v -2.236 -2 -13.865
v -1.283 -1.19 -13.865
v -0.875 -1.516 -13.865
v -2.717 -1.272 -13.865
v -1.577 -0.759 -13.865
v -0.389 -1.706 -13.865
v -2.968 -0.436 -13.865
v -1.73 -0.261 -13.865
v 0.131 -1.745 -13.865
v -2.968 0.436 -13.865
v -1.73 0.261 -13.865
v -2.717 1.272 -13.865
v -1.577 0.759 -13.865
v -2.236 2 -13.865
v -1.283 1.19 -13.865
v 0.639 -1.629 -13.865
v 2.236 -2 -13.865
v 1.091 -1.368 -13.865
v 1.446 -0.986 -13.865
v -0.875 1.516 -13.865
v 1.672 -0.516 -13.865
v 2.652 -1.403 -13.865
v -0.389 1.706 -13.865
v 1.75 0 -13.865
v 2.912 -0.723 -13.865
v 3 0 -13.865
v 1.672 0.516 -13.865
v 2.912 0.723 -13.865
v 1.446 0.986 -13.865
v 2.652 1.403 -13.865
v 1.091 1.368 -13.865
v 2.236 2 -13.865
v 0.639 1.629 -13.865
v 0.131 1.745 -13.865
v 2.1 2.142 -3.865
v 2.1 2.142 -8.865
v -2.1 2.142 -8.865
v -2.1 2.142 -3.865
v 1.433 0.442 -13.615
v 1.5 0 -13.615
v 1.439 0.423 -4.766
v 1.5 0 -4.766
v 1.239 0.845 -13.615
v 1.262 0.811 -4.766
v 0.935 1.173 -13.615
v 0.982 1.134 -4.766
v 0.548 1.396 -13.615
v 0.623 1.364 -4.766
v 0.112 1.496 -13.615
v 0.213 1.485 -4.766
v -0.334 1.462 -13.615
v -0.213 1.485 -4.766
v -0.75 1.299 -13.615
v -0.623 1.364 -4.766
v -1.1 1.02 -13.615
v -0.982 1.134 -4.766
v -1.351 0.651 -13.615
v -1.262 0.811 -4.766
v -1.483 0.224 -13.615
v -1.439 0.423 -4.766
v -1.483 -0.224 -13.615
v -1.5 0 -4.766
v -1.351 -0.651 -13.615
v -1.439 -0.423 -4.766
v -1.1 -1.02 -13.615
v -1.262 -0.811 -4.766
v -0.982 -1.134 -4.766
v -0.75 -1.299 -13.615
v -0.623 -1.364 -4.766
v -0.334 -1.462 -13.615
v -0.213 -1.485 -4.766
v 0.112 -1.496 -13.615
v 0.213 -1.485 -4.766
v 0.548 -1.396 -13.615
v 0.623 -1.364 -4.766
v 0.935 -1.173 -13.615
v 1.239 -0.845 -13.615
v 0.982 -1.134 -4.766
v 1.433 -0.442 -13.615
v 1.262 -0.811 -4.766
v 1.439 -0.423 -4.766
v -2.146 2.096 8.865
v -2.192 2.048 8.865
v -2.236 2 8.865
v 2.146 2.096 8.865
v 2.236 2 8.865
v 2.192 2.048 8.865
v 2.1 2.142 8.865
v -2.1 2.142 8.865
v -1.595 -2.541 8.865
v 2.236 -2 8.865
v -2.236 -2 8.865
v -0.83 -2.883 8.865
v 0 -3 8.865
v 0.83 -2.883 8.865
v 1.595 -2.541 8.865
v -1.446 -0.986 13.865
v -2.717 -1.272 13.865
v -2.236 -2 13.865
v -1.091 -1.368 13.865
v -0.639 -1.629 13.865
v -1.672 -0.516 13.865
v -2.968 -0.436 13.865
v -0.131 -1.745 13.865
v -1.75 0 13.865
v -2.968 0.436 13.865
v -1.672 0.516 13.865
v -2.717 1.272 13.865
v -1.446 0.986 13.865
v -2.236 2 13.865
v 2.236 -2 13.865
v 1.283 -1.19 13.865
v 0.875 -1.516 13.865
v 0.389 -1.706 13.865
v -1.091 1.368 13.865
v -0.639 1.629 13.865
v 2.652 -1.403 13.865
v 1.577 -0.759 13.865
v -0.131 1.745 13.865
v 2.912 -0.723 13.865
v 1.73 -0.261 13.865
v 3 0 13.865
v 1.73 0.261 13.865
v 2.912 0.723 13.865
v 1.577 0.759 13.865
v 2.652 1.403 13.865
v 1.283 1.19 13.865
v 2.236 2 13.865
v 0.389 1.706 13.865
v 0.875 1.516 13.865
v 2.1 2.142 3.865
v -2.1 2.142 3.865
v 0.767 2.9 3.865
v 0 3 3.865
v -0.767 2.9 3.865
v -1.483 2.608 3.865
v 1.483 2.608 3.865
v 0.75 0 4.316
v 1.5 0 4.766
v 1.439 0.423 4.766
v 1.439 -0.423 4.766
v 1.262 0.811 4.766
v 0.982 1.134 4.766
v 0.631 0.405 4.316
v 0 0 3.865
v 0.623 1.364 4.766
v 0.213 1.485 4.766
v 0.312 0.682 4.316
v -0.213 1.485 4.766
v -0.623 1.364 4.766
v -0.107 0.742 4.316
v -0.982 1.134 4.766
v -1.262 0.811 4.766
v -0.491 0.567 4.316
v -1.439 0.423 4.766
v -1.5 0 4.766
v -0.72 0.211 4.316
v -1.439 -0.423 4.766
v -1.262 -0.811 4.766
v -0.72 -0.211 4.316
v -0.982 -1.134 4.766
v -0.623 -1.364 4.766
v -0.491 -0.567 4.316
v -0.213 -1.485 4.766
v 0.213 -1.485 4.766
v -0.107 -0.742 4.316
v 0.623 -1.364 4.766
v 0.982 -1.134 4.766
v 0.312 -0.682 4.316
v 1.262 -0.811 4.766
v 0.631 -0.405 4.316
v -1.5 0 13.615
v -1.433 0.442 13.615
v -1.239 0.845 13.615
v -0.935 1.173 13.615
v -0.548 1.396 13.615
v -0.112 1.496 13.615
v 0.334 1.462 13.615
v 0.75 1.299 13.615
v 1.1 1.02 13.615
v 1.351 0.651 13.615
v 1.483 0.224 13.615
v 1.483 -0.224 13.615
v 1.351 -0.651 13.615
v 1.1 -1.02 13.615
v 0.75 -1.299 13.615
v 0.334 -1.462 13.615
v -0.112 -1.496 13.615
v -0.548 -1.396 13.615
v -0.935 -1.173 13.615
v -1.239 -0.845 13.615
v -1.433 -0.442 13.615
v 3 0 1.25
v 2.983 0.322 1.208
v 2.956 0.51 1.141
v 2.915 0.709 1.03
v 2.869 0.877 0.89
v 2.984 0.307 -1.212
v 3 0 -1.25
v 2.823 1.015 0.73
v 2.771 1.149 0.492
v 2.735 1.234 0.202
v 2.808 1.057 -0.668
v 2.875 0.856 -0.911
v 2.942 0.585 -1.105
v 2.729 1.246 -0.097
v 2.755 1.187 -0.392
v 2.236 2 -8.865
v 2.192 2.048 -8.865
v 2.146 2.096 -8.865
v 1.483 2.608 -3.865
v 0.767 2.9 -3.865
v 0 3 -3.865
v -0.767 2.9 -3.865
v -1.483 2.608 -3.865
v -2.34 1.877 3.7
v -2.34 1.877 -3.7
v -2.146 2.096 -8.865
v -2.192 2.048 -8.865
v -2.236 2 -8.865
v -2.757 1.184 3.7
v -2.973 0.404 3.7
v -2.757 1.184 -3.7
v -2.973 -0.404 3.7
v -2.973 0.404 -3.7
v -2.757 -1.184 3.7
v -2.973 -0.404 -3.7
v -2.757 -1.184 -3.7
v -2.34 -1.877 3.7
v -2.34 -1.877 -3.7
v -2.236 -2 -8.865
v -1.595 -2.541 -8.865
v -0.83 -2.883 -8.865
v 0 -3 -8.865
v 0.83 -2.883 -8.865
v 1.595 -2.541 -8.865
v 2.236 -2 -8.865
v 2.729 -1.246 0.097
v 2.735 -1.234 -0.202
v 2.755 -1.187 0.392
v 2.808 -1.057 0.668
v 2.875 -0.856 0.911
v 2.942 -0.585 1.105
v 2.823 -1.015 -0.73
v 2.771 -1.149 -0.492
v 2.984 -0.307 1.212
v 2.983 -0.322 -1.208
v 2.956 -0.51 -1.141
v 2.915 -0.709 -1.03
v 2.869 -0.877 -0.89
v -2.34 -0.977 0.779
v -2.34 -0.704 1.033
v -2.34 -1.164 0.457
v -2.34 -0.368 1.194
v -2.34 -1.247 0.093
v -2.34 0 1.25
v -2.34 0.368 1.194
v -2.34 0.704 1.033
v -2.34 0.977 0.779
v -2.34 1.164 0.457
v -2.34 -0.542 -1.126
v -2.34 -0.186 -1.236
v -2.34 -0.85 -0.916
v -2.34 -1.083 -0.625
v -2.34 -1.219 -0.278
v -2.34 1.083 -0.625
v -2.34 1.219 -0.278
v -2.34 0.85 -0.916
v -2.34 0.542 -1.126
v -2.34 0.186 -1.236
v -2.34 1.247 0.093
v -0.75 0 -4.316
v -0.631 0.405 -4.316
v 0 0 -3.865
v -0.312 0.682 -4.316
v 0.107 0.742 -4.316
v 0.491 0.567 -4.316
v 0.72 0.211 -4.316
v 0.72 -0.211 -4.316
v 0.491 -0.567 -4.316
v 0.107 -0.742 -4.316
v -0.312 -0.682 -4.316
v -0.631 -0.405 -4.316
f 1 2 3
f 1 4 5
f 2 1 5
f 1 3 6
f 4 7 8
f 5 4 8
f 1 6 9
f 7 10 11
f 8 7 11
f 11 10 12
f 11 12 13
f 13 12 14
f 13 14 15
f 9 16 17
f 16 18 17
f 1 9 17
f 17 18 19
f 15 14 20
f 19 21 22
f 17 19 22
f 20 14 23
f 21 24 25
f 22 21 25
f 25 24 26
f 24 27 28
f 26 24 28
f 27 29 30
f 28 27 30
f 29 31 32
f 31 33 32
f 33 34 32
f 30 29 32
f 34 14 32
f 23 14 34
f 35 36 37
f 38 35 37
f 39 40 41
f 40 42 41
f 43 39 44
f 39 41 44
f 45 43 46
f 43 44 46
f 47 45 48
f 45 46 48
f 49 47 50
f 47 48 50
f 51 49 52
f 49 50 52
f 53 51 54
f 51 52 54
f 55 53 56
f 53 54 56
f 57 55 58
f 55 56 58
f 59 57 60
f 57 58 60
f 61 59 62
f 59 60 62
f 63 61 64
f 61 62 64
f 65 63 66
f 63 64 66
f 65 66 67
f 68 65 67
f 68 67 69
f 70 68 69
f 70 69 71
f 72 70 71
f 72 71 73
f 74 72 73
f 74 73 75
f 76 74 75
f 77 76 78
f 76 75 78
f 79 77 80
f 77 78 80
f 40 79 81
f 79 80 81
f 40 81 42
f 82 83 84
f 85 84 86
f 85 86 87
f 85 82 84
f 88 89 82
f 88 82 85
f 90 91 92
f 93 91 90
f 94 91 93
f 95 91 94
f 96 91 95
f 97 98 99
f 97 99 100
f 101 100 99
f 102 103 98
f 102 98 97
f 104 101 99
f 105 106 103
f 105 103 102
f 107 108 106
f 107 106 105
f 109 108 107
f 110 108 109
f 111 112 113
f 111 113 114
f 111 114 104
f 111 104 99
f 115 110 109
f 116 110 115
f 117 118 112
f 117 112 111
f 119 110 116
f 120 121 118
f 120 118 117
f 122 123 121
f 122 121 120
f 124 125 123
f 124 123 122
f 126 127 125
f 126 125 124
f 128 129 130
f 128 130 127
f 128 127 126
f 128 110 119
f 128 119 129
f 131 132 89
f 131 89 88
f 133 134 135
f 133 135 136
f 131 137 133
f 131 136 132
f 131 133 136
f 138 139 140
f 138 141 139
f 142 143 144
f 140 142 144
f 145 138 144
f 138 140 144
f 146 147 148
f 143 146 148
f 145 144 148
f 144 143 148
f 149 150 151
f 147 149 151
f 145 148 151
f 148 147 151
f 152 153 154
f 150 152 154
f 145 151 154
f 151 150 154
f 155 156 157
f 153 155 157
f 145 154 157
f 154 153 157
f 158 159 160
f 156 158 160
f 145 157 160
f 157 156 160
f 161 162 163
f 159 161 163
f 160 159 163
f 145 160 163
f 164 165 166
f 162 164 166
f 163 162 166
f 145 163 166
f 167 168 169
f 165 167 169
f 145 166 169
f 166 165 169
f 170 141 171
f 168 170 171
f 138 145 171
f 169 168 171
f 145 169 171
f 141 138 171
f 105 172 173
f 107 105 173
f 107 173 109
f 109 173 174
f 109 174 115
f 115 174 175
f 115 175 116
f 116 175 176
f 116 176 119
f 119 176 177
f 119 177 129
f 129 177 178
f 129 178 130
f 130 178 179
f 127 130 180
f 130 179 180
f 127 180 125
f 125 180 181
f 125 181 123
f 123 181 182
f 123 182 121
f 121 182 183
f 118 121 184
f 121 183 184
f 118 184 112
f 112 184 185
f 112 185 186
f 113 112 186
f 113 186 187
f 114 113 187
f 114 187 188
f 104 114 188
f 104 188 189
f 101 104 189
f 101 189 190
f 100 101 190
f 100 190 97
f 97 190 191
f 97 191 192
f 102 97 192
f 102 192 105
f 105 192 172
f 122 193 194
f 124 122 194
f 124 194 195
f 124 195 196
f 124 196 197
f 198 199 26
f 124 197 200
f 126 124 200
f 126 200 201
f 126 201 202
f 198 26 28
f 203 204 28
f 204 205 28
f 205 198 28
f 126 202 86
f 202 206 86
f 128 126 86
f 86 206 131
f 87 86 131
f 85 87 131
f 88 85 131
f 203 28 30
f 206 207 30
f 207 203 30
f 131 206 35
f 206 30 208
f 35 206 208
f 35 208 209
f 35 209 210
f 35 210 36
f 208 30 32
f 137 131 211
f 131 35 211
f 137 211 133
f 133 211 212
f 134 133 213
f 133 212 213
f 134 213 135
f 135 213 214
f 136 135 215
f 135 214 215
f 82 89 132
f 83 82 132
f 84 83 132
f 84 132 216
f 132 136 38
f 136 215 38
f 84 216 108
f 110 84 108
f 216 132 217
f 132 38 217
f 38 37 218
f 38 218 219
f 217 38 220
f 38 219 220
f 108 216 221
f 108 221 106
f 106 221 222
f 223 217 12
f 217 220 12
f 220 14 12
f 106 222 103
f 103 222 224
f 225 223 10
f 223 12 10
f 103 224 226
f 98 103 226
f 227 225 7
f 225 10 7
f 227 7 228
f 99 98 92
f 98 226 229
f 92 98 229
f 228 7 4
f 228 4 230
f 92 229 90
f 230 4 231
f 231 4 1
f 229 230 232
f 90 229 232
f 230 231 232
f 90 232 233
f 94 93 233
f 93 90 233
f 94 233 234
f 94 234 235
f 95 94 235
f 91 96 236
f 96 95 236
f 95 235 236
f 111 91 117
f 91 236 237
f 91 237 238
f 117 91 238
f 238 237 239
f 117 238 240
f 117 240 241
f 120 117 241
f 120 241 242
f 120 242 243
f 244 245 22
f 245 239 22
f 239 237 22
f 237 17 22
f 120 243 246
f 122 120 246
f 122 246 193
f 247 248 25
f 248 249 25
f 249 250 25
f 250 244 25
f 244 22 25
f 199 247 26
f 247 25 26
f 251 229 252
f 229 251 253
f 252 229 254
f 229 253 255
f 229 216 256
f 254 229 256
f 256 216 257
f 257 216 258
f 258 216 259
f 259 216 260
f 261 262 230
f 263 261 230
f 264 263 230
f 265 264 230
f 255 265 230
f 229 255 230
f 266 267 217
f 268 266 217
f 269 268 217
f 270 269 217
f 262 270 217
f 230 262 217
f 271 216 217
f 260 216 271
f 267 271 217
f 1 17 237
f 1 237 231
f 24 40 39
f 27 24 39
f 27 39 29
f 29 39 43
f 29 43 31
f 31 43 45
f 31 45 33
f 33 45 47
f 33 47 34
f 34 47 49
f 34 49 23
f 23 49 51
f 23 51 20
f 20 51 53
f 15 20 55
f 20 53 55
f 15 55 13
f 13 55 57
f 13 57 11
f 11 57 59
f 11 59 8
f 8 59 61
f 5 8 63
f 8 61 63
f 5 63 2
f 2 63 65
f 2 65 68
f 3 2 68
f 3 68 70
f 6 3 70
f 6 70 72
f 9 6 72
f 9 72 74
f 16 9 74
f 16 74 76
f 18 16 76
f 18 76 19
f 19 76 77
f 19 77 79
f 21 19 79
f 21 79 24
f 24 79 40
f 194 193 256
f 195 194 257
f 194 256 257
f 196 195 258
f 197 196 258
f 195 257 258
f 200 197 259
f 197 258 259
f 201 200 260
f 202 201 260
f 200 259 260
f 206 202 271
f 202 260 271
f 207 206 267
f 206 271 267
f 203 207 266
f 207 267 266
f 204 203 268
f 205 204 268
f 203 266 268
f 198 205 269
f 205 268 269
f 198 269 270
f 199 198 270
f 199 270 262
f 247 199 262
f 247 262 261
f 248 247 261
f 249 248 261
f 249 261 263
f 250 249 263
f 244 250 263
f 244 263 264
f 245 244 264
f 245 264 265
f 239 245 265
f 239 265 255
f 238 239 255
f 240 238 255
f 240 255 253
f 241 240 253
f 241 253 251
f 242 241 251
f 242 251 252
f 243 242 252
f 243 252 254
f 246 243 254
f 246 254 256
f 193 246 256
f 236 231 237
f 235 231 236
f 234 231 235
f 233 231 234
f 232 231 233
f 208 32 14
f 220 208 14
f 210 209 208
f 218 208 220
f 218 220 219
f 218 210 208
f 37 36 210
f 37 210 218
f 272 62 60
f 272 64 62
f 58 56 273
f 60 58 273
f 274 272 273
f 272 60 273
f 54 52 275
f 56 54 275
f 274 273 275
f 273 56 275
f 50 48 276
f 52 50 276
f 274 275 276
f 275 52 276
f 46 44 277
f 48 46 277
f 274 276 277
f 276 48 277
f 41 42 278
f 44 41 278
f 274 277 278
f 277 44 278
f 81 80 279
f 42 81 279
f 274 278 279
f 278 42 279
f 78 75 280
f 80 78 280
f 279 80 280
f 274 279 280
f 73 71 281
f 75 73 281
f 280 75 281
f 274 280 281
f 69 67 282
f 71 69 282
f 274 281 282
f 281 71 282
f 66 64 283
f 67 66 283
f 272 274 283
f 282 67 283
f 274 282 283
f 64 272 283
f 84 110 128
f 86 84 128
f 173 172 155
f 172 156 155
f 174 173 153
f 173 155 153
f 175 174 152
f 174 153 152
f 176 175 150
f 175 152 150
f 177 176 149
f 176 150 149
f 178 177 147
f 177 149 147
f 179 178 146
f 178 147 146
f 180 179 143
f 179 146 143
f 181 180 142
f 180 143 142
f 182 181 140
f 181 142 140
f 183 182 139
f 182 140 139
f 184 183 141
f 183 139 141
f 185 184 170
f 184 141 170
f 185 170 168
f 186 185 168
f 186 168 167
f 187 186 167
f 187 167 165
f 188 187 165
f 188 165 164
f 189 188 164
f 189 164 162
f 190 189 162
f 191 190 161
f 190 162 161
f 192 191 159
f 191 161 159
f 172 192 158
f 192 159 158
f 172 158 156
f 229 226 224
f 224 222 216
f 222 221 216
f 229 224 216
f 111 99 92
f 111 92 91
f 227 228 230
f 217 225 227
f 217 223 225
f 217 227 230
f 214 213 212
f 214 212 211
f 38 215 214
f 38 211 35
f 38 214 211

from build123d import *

# Parameters (mm, degrees)
BOSS_EXTRUDE1_DEPTH                                 = 13.865
BOSS_EXTRUDE1_DEPTH_BACK                            = 13.865
SKETCH1_R                                           = 3
CUT_EXTRUDE1_DEPTH                                  = 5
CUT_EXTRUDE2_DEPTH                                  = 5
CUT_EXTRUDE5_DEPTH                                  = 5
CUT_EXTRUDE6_START                                  = -5
CUT_EXTRUDE6_DEPTH                                  = 5
CSK_FOR_M3_COUNTERSUNK_FLAT_HEAD_SCREW1_D           = 3
CSK_FOR_M3_COUNTERSUNK_FLAT_HEAD_SCREW1_DEPTH       = 9.098709071
CSK_FOR_M3_COUNTERSUNK_FLAT_HEAD_SCREW1_CSINK_D     = 3.5
CSK_FOR_M3_COUNTERSUNK_FLAT_HEAD_SCREW1_CSINK_ANGLE = 90
CSK_FOR_M3_COUNTERSUNK_FLAT_HEAD_SCREW1_TIP         = 0.901290929
CSK_FOR_M3_COUNTERSUNK_FLAT_HEAD_SCREW2_D           = 3
CSK_FOR_M3_COUNTERSUNK_FLAT_HEAD_SCREW2_DEPTH       = 9.098709071
CSK_FOR_M3_COUNTERSUNK_FLAT_HEAD_SCREW2_CSINK_D     = 3.5
CSK_FOR_M3_COUNTERSUNK_FLAT_HEAD_SCREW2_CSINK_ANGLE = 90
CSK_FOR_M3_COUNTERSUNK_FLAT_HEAD_SCREW2_TIP         = 0.901290929
SKETCH14_W                                          = 7.4
SKETCH14_H                                          = 4
CUT_EXTRUDE9_DEPTH                                  = 3
SKETCH15_R                                          = 1.25
CUT_EXTRUDE10_DEPTH                                 = 16.157632566


with BuildPart() as part:
    # Sketch1 → Boss-Extrude1 (new, two sides: drawn at the far end of the back side and taken through both)
    with BuildSketch(Plane.XY.offset(-BOSS_EXTRUDE1_DEPTH_BACK)):
        Circle(SKETCH1_R)
    extrude(amount=BOSS_EXTRUDE1_DEPTH + BOSS_EXTRUDE1_DEPTH_BACK)

    # Sketch2 → Cut-Extrude1 (cut)
    with BuildSketch(Plane.XY.offset(13.865)):
        with BuildLine():
            Line((-2.236067977, 2), (2.236067977, 2))
            ThreePointArc((2.236067977, 2), (0, 3), (-2.236067977, 2))
        make_face()
        with BuildLine():
            Line((-2.236067977, -2), (2.236067977, -2))
            ThreePointArc((2.236067977, -2), (0, -3), (-2.236067977, -2))
        make_face()
    extrude(amount=-CUT_EXTRUDE1_DEPTH, mode=Mode.SUBTRACT)

    # Sketch3 → Cut-Extrude2 (cut)
    with BuildSketch(Plane(origin=(0, 0, -13.865), x_dir=(-1, 0, 0), z_dir=(0, 0, -1))):
        with BuildLine():
            Line((-2.236067977, 2), (2.236067977, 2))
            ThreePointArc((2.236067977, 2), (0, 3), (-2.236067977, 2))
        make_face()
        with BuildLine():
            Line((-2.236067977, -2), (2.236067977, -2))
            ThreePointArc((2.236067977, -2), (0, -3), (-2.236067977, -2))
        make_face()
    extrude(amount=-CUT_EXTRUDE2_DEPTH, mode=Mode.SUBTRACT)

    # Sketch4 → Cut-Extrude5 (cut)
    with BuildSketch(Plane(origin=(0, 0, -8.865), x_dir=(-1, 0, 0), z_dir=(0, 0, -1))):
        with BuildLine():
            Line((-2.1, 2.142428529), (2.1, 2.142428529))
            ThreePointArc((2.1, 2.142428529), (0, 3), (-2.1, 2.142428529))
        make_face()
    extrude(amount=-CUT_EXTRUDE5_DEPTH, mode=Mode.SUBTRACT)

    # Sketch5 → Cut-Extrude6 (cut)
    with BuildSketch(Plane.XY.offset(8.865).offset(CUT_EXTRUDE6_START)):
        with BuildLine():
            Line((-2.1, 2.142428529), (2.1, 2.142428529))
            ThreePointArc((2.1, 2.142428529), (0, 3), (-2.1, 2.142428529))
        make_face()
    extrude(amount=CUT_EXTRUDE6_DEPTH, mode=Mode.SUBTRACT)

    # CSK for M3 Countersunk Flat Head Screw1
    with Locations(Plane(origin=(0, 0, -13.865), x_dir=(-1, 0, 0), z_dir=(0, 0, -1))):
        with Locations((0, 0)):
            CounterSinkHole(CSK_FOR_M3_COUNTERSUNK_FLAT_HEAD_SCREW1_D / 2, CSK_FOR_M3_COUNTERSUNK_FLAT_HEAD_SCREW1_CSINK_D / 2, depth=CSK_FOR_M3_COUNTERSUNK_FLAT_HEAD_SCREW1_DEPTH, counter_sink_angle=CSK_FOR_M3_COUNTERSUNK_FLAT_HEAD_SCREW1_CSINK_ANGLE)
            with Locations((0, 0, -(CSK_FOR_M3_COUNTERSUNK_FLAT_HEAD_SCREW1_DEPTH + CSK_FOR_M3_COUNTERSUNK_FLAT_HEAD_SCREW1_TIP / 2))):  # 118° drill point
                Cone(0, CSK_FOR_M3_COUNTERSUNK_FLAT_HEAD_SCREW1_D / 2, CSK_FOR_M3_COUNTERSUNK_FLAT_HEAD_SCREW1_TIP, mode=Mode.SUBTRACT)

    # CSK for M3 Countersunk Flat Head Screw2
    with Locations(Plane.XY.offset(13.865)):
        with Locations((0, 0)):
            CounterSinkHole(CSK_FOR_M3_COUNTERSUNK_FLAT_HEAD_SCREW2_D / 2, CSK_FOR_M3_COUNTERSUNK_FLAT_HEAD_SCREW2_CSINK_D / 2, depth=CSK_FOR_M3_COUNTERSUNK_FLAT_HEAD_SCREW2_DEPTH, counter_sink_angle=CSK_FOR_M3_COUNTERSUNK_FLAT_HEAD_SCREW2_CSINK_ANGLE)
            with Locations((0, 0, -(CSK_FOR_M3_COUNTERSUNK_FLAT_HEAD_SCREW2_DEPTH + CSK_FOR_M3_COUNTERSUNK_FLAT_HEAD_SCREW2_TIP / 2))):  # 118° drill point
                Cone(0, CSK_FOR_M3_COUNTERSUNK_FLAT_HEAD_SCREW2_D / 2, CSK_FOR_M3_COUNTERSUNK_FLAT_HEAD_SCREW2_TIP, mode=Mode.SUBTRACT)

    # Sketch14 → Cut-Extrude9 (cut)
    with BuildSketch(Plane(origin=(-5.34, 0, 0), x_dir=(0, 0, -1), z_dir=(1, 0, 0))):
        Rectangle(SKETCH14_W, SKETCH14_H)
    extrude(amount=CUT_EXTRUDE9_DEPTH, mode=Mode.SUBTRACT)

    # Sketch15 → Cut-Extrude10 (cut, through all)
    with BuildSketch(Plane.ZY.offset(2.34)):
        Circle(SKETCH15_R)
    extrude(amount=-CUT_EXTRUDE10_DEPTH, mode=Mode.SUBTRACT)


solid = part.part
